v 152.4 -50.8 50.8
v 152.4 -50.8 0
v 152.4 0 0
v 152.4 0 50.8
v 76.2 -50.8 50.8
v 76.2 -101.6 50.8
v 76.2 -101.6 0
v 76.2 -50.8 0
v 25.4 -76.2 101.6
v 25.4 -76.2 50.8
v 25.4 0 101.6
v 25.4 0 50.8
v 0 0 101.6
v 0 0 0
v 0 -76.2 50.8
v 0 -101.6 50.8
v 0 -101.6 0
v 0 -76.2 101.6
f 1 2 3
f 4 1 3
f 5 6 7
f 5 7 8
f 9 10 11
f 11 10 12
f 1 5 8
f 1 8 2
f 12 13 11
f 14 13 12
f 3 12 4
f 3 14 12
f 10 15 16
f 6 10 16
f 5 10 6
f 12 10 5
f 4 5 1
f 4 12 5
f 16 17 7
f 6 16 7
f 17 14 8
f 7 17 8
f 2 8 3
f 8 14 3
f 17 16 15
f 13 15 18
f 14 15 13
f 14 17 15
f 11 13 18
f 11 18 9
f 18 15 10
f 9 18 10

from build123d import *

# Parameters (mm, degrees)
F0_W     = 152.4
F0_H     = 101.6
F1_DEPTH = 50.8
F2_W     = 25.4
F2_H     = 76.2
F3_DEPTH = 50.8
F4_W     = 76.2
F4_H     = 50.8
F5_DEPTH = 50.801


with BuildPart() as f1:
    # F0 (on Top) → F1 (new body)
    with BuildSketch(Plane.XY):
        with Locations((76.2, -50.8)):
            Rectangle(F0_W, F0_H)
    extrude(amount=F1_DEPTH)

    # F2 (on face) → F3 (join)
    with BuildSketch(Plane.XY.offset(50.8)):
        with Locations((12.7, -38.1)):
            Rectangle(F2_W, F2_H)
    extrude(amount=F3_DEPTH)

    # F4 (on face) → F5 (cut, through all)
    with BuildSketch(Plane.XY.offset(50.8)):
        with Locations((114.3, -76.2)):
            Rectangle(F4_W, F4_H)
    extrude(amount=-F5_DEPTH, mode=Mode.SUBTRACT)


solid = f1.part
